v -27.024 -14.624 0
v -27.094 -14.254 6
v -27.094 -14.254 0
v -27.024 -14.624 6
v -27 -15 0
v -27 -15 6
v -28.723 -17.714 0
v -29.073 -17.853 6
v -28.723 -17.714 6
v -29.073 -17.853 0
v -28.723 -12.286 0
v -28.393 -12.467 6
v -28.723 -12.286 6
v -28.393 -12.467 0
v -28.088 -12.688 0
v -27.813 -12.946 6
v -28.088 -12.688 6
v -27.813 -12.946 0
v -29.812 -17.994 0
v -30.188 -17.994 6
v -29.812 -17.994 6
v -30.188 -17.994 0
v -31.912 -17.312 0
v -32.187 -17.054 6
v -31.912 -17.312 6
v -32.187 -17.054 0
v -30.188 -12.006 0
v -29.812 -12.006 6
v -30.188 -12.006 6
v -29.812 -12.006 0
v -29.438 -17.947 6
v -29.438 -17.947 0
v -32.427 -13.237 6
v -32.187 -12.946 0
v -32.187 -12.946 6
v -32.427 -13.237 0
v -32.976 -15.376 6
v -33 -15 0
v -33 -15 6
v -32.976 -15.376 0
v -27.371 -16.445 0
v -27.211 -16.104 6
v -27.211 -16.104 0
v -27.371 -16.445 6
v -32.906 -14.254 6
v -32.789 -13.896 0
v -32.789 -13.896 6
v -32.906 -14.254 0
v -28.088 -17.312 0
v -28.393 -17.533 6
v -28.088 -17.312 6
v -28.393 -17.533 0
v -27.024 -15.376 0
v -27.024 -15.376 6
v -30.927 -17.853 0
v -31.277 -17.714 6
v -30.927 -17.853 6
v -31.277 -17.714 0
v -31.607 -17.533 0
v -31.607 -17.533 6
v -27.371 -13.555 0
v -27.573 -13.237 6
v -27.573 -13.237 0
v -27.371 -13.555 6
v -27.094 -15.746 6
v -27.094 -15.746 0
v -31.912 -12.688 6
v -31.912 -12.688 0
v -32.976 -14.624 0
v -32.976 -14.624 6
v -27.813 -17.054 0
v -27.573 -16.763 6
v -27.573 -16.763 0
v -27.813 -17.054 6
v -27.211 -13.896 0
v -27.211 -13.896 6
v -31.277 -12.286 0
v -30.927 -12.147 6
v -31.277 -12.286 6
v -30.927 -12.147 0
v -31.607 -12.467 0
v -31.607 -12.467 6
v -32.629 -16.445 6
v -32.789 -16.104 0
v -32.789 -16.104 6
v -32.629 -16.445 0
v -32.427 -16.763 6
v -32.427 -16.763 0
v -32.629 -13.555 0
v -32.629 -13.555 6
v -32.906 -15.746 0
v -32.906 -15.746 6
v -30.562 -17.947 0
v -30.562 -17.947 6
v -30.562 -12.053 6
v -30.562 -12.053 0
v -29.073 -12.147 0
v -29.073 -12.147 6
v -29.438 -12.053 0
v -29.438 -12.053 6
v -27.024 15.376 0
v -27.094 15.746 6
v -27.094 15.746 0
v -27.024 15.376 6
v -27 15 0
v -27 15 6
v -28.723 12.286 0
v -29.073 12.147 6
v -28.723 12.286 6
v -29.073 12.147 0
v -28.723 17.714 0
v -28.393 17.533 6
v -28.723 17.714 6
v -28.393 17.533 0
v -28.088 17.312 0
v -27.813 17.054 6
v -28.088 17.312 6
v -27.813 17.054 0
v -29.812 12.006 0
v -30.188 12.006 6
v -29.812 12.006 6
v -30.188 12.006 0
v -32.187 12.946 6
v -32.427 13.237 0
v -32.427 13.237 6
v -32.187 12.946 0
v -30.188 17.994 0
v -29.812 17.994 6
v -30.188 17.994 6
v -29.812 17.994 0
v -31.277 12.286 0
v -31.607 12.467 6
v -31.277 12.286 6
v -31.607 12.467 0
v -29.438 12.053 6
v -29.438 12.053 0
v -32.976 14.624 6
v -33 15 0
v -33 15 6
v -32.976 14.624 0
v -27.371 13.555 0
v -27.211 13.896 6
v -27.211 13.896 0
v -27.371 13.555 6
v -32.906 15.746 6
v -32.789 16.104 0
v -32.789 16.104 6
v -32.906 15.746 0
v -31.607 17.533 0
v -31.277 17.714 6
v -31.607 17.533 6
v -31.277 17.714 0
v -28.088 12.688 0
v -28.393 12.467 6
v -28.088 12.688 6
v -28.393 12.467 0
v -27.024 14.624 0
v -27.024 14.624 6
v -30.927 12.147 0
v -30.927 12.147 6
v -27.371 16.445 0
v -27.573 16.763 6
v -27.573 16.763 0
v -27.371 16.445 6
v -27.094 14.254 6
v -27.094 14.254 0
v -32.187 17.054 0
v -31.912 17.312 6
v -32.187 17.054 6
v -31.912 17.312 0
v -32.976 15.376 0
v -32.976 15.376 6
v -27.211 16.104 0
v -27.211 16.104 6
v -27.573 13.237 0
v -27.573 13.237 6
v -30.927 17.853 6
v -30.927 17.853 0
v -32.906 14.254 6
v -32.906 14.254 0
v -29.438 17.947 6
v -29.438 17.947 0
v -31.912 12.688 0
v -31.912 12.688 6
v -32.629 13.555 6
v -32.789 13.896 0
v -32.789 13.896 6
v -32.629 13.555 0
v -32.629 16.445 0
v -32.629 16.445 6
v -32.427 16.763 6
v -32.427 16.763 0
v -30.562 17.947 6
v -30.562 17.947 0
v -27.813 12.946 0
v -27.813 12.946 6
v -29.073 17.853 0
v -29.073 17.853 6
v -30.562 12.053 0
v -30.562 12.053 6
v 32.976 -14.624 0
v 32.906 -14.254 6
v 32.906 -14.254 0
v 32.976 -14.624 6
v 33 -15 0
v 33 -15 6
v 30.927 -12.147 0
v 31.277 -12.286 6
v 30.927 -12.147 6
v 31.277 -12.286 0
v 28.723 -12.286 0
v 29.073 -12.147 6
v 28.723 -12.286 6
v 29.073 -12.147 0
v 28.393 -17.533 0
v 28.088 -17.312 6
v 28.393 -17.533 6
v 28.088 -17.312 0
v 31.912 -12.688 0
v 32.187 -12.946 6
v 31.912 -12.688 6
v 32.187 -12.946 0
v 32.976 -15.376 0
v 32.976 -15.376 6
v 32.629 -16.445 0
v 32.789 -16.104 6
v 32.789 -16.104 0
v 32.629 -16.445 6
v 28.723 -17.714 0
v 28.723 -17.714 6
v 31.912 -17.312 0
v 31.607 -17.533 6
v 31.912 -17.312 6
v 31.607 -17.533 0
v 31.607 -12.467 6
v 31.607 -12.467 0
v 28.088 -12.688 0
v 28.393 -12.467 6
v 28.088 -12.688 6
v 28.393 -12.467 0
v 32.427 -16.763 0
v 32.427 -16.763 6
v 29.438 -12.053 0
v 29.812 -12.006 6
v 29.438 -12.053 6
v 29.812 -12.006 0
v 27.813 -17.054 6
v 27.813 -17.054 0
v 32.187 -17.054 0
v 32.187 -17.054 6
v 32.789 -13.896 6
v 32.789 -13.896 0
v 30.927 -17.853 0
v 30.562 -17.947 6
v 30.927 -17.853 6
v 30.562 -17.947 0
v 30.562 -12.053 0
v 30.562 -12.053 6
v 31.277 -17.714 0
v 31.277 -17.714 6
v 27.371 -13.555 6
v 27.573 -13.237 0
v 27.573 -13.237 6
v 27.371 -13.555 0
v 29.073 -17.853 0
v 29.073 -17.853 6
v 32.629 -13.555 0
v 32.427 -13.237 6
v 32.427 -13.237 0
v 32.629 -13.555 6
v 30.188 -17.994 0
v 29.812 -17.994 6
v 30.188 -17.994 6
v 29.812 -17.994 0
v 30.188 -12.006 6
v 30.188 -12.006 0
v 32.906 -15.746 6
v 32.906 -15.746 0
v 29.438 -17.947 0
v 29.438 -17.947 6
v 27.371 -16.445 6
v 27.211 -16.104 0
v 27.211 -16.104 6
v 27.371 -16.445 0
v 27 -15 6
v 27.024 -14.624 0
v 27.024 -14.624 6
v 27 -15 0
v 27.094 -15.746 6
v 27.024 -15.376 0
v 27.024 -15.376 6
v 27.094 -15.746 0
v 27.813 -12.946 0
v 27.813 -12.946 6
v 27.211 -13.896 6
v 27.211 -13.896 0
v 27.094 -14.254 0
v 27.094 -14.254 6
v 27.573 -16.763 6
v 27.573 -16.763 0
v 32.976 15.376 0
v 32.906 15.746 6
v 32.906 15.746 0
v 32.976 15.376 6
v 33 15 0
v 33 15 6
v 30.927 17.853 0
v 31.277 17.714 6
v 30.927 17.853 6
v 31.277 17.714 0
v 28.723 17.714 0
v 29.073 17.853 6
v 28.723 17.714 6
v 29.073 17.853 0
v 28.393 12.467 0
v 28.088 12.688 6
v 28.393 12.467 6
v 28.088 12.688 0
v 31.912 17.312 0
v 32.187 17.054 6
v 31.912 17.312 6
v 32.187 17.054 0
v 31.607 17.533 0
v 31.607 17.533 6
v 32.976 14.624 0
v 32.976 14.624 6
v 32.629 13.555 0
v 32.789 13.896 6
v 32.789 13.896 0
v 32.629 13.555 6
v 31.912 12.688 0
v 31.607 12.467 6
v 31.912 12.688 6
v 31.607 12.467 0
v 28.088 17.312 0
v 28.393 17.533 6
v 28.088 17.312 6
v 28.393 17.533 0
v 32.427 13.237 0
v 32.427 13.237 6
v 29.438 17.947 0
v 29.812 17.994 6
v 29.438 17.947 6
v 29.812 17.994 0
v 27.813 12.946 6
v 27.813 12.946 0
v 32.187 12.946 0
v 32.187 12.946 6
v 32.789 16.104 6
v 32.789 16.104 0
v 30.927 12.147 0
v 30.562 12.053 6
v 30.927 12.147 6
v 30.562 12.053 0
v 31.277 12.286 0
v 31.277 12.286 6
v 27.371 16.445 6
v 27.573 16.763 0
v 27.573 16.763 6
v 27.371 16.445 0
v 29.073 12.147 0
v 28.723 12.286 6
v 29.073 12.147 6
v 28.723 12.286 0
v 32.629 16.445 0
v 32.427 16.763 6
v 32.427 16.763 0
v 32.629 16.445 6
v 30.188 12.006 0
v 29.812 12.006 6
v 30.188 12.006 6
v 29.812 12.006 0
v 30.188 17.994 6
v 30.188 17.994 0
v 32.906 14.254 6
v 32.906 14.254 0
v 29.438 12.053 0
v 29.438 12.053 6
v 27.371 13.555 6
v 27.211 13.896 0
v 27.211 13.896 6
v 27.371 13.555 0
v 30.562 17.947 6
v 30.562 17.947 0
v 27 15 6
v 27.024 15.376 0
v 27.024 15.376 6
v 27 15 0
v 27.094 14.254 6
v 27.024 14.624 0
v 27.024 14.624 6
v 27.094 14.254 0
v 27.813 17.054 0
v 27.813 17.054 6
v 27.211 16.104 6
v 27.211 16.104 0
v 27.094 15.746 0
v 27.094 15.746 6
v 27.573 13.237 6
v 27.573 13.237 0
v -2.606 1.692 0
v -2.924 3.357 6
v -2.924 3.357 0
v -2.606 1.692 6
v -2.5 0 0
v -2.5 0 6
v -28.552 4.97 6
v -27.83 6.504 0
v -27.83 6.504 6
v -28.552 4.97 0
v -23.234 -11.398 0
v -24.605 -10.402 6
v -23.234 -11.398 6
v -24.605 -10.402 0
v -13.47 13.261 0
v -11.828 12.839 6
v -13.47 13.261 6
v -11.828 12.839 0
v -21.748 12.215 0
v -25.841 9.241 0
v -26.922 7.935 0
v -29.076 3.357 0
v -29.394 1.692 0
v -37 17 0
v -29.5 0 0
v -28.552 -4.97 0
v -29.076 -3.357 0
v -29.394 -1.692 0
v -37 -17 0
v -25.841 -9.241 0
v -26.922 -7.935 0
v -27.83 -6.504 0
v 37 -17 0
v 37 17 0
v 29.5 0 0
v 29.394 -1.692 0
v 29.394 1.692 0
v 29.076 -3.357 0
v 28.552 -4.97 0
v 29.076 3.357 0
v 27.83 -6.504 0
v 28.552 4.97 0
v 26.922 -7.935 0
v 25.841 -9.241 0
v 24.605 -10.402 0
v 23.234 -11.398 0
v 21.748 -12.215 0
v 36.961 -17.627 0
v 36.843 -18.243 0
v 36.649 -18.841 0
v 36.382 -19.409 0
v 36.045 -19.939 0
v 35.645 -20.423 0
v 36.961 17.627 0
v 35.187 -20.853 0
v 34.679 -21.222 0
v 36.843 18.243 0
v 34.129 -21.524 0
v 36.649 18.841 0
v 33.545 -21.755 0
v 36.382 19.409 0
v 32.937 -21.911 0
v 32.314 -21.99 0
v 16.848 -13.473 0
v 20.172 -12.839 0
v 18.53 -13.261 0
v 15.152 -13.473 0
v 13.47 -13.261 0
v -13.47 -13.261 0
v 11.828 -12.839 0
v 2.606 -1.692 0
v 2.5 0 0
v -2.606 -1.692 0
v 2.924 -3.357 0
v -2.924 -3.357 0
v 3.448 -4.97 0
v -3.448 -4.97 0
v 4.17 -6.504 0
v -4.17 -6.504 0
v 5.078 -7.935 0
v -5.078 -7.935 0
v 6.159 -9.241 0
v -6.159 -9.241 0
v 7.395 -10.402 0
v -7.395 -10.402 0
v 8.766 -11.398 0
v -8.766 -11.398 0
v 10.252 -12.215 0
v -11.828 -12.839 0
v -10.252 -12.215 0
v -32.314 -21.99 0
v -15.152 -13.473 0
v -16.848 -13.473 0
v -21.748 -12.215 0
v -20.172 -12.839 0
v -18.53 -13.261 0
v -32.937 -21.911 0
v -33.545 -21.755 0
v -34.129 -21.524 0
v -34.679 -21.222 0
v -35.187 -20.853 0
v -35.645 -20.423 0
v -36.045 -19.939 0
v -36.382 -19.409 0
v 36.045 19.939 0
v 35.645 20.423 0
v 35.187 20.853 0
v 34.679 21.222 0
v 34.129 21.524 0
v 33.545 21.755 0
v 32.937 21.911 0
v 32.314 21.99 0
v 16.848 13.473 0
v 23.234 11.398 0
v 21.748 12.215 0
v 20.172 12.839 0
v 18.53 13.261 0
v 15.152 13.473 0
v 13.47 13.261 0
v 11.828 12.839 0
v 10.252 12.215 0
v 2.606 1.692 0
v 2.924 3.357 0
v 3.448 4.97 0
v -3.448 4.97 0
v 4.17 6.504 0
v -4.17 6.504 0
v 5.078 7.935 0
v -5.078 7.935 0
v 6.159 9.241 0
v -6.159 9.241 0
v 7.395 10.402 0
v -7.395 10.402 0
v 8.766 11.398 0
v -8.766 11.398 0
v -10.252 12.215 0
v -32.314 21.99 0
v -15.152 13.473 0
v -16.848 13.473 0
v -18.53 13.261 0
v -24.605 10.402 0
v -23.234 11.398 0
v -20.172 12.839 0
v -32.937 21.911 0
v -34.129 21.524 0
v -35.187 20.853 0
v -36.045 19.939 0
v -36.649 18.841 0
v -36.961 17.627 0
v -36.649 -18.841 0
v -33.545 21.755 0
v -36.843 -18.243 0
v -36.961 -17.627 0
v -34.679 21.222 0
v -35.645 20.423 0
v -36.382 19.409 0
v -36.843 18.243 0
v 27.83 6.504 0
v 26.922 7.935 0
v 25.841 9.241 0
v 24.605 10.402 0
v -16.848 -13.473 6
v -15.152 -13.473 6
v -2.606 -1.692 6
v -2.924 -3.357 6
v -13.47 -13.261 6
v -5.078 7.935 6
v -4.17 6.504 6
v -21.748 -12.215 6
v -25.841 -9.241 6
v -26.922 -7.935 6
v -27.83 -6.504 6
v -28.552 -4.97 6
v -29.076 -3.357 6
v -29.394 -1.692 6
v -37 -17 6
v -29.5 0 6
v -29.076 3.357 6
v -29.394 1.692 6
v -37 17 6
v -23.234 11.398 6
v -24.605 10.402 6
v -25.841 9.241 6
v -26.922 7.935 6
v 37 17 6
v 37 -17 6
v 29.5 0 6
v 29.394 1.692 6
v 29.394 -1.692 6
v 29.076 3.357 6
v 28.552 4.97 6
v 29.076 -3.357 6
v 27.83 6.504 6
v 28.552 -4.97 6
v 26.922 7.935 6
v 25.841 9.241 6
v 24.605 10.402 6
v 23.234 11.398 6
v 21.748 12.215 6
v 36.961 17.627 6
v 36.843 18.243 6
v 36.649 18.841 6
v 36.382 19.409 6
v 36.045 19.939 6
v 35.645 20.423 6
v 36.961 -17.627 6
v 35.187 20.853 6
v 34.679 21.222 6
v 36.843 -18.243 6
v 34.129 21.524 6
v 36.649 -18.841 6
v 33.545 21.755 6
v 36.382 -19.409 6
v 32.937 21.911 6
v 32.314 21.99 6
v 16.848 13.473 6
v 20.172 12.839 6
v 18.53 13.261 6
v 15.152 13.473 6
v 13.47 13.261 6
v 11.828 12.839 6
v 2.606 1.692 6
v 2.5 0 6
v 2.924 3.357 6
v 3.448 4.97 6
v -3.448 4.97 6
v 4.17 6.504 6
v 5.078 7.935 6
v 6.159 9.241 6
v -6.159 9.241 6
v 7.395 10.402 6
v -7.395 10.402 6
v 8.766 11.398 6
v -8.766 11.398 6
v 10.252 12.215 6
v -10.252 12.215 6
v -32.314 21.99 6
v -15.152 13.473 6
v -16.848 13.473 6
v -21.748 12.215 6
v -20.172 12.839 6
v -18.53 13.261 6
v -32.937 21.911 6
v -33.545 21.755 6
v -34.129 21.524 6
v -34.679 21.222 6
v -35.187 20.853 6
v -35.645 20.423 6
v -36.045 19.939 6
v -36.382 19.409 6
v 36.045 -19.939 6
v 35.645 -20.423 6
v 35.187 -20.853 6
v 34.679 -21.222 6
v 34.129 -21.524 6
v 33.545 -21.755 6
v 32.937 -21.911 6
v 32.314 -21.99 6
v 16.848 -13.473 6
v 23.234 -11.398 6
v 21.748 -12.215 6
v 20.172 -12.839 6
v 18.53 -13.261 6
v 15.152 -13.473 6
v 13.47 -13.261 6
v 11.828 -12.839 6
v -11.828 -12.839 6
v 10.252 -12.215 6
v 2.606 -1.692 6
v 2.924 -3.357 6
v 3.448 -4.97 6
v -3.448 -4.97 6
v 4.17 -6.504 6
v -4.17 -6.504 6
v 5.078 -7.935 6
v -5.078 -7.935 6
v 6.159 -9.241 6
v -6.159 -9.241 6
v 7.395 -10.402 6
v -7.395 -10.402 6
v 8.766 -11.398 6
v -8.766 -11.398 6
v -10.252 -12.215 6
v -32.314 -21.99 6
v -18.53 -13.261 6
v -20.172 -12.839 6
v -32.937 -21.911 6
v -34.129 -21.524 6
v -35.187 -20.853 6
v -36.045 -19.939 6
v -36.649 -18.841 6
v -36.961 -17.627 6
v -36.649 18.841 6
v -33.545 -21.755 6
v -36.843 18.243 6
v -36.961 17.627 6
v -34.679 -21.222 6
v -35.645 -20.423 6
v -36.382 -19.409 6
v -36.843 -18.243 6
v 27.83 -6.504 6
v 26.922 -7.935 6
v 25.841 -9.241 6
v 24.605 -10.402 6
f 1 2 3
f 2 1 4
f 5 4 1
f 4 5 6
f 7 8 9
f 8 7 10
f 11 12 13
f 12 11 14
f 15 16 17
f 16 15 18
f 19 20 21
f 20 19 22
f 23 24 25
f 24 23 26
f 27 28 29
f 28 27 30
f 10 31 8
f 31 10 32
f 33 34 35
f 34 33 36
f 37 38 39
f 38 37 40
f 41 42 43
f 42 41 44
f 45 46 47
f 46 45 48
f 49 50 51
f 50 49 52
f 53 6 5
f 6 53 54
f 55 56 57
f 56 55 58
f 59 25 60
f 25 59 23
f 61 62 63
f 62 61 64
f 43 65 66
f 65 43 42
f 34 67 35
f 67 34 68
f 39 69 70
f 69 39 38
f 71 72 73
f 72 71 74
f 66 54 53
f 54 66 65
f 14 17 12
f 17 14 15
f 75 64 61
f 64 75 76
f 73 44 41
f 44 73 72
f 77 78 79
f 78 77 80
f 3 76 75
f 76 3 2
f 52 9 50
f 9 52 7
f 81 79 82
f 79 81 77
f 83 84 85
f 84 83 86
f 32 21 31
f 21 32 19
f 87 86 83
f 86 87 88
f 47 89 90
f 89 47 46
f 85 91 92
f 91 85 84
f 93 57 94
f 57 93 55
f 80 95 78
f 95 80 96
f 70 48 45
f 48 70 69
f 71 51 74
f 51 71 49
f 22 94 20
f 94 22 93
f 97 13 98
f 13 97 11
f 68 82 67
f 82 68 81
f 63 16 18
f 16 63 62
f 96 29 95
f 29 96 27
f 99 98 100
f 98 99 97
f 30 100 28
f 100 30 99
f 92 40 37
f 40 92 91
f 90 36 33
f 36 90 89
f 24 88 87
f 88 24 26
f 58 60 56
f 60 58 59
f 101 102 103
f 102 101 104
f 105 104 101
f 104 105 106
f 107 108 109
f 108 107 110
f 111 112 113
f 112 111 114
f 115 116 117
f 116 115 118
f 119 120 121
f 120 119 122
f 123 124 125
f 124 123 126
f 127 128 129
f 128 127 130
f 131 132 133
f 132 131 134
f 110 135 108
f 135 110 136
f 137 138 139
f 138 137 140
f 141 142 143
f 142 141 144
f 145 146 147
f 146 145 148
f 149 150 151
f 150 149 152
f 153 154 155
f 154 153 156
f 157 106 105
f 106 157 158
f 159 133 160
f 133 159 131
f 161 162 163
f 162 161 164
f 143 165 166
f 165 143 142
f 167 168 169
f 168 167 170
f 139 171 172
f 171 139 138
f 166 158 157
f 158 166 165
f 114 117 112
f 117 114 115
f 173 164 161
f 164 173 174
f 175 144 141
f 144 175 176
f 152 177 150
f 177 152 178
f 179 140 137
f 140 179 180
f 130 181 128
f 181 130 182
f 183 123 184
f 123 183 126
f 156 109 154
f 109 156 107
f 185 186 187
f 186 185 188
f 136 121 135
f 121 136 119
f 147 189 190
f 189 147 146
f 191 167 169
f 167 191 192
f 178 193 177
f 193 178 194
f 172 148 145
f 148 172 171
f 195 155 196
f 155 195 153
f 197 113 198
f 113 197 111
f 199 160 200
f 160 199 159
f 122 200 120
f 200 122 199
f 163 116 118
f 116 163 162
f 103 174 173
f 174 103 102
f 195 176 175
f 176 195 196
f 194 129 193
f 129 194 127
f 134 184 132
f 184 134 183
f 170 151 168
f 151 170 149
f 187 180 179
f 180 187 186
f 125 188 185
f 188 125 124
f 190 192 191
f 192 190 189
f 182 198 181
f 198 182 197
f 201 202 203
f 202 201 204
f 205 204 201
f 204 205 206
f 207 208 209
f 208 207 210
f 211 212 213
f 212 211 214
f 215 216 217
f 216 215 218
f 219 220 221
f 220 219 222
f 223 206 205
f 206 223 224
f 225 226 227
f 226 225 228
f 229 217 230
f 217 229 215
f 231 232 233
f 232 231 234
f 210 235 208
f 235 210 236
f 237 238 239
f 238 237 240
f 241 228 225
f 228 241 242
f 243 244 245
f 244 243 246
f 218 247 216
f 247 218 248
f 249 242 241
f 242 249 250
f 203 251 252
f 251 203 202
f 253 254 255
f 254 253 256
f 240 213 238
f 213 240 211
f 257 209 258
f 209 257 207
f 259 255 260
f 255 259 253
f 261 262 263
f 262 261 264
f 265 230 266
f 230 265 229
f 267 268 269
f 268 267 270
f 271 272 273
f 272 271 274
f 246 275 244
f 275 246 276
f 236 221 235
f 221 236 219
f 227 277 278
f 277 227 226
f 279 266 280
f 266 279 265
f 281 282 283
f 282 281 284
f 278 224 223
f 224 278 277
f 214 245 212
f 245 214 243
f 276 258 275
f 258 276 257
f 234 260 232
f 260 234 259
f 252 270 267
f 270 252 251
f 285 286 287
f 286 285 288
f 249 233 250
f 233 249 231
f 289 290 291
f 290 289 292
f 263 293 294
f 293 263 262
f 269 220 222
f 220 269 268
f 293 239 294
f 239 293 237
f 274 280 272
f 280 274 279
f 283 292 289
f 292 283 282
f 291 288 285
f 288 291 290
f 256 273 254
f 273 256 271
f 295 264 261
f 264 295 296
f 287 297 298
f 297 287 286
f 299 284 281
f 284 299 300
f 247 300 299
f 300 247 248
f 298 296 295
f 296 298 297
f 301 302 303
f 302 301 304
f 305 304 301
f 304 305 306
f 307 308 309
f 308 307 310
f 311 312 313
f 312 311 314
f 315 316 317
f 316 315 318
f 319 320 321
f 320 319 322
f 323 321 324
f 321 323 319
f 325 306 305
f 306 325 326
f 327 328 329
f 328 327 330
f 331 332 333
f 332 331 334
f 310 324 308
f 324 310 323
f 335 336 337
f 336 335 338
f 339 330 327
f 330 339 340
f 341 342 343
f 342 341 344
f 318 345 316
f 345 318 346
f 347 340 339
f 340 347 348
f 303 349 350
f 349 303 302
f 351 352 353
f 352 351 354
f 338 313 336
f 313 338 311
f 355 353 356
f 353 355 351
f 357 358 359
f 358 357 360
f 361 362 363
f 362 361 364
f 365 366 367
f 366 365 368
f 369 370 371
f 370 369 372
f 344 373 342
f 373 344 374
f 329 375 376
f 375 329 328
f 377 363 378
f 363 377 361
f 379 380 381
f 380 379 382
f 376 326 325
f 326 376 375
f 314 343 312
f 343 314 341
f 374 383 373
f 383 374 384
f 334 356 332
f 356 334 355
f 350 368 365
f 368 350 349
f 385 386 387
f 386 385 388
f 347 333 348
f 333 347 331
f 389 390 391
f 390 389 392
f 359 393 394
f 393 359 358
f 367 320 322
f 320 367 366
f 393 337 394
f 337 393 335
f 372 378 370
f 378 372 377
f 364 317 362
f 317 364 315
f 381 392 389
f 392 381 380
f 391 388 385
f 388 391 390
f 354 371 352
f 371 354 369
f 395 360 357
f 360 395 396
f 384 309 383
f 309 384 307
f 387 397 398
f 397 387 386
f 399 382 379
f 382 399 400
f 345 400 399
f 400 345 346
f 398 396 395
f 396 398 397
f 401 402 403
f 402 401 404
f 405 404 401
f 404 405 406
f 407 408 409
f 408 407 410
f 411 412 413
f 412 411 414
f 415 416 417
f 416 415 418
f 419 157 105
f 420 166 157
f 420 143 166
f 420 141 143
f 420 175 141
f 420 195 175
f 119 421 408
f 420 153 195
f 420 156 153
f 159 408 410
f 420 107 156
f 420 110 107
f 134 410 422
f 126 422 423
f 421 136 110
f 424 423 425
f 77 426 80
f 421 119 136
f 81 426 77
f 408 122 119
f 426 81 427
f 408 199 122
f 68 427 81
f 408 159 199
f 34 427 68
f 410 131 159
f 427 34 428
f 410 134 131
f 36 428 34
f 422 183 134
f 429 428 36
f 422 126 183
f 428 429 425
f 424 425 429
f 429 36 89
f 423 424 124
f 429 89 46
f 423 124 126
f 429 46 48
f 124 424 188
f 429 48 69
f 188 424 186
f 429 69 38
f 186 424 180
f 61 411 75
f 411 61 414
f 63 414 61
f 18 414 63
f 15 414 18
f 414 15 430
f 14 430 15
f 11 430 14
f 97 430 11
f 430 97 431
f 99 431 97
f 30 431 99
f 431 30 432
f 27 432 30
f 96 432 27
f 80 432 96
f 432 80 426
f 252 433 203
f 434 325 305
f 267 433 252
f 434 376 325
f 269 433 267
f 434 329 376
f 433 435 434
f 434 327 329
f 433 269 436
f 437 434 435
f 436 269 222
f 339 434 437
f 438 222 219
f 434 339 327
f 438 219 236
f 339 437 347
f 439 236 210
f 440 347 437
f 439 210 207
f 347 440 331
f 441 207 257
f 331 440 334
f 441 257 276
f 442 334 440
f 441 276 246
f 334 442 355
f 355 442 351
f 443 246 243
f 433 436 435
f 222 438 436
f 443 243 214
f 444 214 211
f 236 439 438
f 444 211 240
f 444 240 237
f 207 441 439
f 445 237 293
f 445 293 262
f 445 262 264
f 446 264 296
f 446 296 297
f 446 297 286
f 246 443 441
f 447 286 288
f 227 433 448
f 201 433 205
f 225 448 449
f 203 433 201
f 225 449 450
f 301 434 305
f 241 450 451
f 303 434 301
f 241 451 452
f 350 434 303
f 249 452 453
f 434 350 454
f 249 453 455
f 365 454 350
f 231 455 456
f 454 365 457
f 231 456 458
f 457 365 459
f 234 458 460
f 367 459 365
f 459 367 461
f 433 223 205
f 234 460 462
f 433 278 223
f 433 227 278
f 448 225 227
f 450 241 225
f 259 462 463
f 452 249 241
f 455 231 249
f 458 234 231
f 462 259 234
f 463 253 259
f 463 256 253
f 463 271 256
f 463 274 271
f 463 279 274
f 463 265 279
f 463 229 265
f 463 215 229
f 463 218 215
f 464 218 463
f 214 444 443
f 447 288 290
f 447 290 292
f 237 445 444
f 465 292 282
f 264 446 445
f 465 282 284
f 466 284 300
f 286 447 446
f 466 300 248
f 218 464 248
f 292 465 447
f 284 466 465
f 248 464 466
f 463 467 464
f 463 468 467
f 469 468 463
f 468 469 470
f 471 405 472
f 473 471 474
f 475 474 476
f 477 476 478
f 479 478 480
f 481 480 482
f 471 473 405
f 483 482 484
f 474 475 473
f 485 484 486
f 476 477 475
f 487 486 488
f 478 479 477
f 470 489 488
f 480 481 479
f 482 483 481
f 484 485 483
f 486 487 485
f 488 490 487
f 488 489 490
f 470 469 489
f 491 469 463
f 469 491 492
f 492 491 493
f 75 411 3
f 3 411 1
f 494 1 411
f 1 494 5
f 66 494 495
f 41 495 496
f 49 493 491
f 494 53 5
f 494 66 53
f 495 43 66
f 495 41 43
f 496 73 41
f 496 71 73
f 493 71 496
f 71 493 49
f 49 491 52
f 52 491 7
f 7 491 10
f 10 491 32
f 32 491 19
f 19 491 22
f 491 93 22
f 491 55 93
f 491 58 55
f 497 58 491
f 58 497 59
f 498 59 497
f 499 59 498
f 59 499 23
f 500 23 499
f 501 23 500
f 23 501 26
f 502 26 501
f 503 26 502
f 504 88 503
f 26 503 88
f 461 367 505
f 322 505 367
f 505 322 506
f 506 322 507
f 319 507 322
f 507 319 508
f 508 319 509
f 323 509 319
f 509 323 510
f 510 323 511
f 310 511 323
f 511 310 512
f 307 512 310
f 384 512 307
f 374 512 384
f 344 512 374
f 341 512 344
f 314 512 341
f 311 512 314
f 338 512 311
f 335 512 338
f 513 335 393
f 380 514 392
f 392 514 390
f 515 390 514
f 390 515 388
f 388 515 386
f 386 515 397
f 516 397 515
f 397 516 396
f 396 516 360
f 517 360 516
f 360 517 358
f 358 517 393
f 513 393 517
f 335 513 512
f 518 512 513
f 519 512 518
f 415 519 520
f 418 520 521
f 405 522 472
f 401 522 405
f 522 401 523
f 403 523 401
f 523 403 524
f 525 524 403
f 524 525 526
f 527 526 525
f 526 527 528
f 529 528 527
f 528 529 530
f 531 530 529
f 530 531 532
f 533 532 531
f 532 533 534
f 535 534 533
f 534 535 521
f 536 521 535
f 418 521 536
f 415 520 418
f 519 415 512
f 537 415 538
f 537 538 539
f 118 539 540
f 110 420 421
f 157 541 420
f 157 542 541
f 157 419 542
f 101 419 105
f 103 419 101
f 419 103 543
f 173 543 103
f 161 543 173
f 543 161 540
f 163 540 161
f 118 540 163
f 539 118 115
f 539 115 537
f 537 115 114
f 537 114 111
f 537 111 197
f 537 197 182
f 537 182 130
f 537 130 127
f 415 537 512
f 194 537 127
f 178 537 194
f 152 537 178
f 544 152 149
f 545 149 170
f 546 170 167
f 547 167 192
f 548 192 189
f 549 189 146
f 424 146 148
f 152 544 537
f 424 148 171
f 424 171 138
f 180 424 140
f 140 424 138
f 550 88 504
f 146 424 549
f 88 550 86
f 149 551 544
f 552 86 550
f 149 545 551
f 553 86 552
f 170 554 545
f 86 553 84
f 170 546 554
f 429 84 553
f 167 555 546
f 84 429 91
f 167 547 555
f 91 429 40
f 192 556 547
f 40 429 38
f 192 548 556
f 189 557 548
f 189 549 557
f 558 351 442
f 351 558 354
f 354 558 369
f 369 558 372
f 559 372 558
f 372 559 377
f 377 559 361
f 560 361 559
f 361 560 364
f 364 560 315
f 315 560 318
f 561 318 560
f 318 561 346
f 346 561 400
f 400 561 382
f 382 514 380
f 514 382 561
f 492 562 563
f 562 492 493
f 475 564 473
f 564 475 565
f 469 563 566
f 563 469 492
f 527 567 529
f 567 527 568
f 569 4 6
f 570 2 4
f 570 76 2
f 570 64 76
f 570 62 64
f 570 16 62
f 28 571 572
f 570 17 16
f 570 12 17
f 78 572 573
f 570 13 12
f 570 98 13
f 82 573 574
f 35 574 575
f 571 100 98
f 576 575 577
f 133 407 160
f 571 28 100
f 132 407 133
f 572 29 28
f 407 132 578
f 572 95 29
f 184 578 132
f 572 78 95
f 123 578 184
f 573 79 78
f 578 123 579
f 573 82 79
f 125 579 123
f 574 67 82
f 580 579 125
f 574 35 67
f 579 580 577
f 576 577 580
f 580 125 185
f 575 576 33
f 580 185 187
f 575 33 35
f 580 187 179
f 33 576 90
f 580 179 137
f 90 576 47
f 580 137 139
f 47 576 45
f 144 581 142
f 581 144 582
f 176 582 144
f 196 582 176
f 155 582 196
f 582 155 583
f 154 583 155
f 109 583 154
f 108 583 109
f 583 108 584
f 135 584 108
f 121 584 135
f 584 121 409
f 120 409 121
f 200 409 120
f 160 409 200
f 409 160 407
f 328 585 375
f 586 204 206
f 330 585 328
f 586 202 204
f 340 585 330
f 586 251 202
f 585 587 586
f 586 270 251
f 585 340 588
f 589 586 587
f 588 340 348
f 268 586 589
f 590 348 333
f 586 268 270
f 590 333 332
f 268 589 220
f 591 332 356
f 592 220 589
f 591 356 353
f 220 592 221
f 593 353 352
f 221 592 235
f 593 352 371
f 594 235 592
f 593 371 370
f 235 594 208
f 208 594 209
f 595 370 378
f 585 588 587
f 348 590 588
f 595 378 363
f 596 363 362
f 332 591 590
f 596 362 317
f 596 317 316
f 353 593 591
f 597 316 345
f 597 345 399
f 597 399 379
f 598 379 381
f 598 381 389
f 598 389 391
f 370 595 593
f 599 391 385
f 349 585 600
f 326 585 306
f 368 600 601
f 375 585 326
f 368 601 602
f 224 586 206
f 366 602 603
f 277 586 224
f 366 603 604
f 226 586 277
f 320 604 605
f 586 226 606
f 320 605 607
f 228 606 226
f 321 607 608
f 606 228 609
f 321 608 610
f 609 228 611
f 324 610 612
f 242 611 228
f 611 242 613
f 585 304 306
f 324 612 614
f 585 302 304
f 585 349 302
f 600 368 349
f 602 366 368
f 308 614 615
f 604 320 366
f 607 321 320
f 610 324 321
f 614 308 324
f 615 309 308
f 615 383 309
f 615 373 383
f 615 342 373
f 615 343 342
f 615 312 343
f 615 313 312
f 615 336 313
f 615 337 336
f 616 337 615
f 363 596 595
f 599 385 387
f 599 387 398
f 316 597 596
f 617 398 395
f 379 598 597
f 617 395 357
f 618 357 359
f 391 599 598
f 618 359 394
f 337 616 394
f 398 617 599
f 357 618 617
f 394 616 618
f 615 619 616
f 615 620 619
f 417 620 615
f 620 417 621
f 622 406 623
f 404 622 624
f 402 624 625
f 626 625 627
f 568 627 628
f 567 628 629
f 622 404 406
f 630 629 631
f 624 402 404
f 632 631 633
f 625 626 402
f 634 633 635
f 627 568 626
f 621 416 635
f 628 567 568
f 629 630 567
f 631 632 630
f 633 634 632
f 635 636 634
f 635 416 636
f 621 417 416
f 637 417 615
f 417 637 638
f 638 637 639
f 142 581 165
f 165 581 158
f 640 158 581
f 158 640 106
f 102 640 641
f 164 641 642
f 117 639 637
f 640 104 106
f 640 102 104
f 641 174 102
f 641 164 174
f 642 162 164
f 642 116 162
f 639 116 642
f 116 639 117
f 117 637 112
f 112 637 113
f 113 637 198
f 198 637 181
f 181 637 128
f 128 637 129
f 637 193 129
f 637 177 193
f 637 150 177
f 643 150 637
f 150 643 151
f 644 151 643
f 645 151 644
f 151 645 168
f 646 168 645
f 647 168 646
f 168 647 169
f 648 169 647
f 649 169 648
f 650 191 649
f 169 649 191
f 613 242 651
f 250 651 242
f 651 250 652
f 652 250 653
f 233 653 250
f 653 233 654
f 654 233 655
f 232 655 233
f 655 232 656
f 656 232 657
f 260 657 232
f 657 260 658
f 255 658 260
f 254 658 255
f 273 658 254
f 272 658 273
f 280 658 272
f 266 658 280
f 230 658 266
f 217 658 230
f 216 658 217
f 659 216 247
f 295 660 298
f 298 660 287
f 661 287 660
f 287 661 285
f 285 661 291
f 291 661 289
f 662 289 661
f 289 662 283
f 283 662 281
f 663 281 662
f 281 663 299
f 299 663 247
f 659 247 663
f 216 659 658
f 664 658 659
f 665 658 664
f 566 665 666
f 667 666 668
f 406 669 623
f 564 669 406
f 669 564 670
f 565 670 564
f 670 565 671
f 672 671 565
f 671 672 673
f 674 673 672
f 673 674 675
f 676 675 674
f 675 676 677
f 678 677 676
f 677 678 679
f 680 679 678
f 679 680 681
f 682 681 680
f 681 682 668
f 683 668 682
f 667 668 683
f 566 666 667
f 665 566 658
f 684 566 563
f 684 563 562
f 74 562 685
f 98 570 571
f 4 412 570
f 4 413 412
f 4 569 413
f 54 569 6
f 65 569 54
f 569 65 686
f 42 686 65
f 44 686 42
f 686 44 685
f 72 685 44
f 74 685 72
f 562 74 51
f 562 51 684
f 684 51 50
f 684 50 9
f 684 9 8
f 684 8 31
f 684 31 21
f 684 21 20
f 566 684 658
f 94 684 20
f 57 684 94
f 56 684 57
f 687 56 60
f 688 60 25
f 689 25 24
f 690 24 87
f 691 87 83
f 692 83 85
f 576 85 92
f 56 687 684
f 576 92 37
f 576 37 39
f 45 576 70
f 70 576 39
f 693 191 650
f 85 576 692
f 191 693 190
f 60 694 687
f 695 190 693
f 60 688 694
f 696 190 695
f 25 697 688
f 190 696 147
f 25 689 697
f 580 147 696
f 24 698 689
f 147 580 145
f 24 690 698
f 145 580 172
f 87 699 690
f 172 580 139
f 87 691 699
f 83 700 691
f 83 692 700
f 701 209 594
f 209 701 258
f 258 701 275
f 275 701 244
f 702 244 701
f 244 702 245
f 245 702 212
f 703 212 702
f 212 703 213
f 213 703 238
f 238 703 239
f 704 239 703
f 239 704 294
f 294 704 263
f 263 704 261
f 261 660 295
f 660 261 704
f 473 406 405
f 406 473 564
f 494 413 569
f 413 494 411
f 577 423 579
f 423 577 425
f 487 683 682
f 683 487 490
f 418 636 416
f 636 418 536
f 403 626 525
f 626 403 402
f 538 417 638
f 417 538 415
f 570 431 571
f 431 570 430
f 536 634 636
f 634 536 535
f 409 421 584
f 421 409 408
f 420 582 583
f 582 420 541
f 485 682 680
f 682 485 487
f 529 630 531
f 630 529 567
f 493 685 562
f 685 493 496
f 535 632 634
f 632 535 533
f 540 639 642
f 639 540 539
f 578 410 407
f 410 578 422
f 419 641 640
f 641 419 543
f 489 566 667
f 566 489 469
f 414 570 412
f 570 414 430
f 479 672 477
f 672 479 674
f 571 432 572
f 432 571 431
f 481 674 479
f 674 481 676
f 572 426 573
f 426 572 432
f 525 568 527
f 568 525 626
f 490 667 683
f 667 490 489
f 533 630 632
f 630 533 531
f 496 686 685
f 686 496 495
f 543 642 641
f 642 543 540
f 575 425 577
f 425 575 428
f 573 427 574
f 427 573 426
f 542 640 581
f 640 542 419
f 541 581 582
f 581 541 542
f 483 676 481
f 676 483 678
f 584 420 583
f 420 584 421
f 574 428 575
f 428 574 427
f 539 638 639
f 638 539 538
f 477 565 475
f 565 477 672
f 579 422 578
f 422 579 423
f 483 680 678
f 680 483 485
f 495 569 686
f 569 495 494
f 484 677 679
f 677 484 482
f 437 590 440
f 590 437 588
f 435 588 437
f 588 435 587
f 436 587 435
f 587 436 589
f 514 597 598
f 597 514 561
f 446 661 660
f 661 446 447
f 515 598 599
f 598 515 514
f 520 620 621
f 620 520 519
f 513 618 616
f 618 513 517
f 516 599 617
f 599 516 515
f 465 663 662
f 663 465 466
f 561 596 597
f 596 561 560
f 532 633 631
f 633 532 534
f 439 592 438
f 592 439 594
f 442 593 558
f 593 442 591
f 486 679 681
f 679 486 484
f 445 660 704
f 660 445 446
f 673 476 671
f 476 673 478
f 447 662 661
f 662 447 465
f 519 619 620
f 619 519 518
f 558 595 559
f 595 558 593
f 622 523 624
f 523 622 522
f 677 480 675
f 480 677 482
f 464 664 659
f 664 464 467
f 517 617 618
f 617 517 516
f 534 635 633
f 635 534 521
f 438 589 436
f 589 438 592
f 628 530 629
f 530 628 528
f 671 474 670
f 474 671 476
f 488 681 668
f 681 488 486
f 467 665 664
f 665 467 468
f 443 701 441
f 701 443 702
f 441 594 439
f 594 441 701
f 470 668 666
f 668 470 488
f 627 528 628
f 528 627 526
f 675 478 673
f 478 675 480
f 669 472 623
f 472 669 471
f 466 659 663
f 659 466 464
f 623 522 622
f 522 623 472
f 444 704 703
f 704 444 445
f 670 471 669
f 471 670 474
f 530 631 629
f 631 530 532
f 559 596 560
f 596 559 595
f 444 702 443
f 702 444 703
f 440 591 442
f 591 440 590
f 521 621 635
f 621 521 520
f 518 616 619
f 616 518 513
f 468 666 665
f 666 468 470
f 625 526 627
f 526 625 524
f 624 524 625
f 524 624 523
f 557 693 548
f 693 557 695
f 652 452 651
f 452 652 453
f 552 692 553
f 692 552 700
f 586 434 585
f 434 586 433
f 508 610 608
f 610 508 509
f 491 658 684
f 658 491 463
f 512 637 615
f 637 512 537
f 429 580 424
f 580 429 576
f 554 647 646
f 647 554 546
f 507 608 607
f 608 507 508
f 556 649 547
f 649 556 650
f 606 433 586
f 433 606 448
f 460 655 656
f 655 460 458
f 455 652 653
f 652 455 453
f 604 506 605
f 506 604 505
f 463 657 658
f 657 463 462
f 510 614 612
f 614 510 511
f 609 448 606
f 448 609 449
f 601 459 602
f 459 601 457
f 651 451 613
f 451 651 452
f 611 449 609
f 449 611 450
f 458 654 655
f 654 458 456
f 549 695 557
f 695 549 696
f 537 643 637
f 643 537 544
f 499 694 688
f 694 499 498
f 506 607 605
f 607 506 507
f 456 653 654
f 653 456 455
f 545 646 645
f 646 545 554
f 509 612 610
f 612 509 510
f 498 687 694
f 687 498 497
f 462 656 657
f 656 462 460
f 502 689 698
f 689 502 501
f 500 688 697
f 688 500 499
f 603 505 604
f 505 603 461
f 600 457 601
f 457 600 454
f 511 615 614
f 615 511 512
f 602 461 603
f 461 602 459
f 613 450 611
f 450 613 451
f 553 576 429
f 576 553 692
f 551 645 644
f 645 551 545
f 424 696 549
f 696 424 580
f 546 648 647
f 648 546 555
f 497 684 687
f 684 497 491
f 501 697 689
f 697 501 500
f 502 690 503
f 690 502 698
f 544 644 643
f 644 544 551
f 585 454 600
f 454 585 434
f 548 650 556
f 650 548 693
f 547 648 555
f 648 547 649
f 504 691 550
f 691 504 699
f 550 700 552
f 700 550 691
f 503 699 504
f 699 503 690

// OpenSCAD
$fn = 50;


difference() {
	union() {
		hull() {
			translate(v = [-32.0000000000, 17.0000000000, 0]) {
				cylinder(h = 6, r = 5);
			}
			translate(v = [32.0000000000, 17.0000000000, 0]) {
				cylinder(h = 6, r = 5);
			}
			translate(v = [-32.0000000000, -17.0000000000, 0]) {
				cylinder(h = 6, r = 5);
			}
			translate(v = [32.0000000000, -17.0000000000, 0]) {
				cylinder(h = 6, r = 5);
			}
		}
	}
	union() {
		#translate(v = [-30.0000000000, -15.0000000000, -100.0000000000]) {
			cylinder(h = 200, r = 3.0000000000);
		}
		#translate(v = [-30.0000000000, 15.0000000000, -100.0000000000]) {
			cylinder(h = 200, r = 3.0000000000);
		}
		#translate(v = [30.0000000000, -15.0000000000, -100.0000000000]) {
			cylinder(h = 200, r = 3.0000000000);
		}
		#translate(v = [30.0000000000, 15.0000000000, -100.0000000000]) {
			cylinder(h = 200, r = 3.0000000000);
		}
		#translate(v = [-16.0000000000, 0, 0]) {
			cylinder(h = 6, r = 13.5000000000);
		}
		#translate(v = [16.0000000000, 0, 0]) {
			cylinder(h = 6, r = 13.5000000000);
		}
	}
}
